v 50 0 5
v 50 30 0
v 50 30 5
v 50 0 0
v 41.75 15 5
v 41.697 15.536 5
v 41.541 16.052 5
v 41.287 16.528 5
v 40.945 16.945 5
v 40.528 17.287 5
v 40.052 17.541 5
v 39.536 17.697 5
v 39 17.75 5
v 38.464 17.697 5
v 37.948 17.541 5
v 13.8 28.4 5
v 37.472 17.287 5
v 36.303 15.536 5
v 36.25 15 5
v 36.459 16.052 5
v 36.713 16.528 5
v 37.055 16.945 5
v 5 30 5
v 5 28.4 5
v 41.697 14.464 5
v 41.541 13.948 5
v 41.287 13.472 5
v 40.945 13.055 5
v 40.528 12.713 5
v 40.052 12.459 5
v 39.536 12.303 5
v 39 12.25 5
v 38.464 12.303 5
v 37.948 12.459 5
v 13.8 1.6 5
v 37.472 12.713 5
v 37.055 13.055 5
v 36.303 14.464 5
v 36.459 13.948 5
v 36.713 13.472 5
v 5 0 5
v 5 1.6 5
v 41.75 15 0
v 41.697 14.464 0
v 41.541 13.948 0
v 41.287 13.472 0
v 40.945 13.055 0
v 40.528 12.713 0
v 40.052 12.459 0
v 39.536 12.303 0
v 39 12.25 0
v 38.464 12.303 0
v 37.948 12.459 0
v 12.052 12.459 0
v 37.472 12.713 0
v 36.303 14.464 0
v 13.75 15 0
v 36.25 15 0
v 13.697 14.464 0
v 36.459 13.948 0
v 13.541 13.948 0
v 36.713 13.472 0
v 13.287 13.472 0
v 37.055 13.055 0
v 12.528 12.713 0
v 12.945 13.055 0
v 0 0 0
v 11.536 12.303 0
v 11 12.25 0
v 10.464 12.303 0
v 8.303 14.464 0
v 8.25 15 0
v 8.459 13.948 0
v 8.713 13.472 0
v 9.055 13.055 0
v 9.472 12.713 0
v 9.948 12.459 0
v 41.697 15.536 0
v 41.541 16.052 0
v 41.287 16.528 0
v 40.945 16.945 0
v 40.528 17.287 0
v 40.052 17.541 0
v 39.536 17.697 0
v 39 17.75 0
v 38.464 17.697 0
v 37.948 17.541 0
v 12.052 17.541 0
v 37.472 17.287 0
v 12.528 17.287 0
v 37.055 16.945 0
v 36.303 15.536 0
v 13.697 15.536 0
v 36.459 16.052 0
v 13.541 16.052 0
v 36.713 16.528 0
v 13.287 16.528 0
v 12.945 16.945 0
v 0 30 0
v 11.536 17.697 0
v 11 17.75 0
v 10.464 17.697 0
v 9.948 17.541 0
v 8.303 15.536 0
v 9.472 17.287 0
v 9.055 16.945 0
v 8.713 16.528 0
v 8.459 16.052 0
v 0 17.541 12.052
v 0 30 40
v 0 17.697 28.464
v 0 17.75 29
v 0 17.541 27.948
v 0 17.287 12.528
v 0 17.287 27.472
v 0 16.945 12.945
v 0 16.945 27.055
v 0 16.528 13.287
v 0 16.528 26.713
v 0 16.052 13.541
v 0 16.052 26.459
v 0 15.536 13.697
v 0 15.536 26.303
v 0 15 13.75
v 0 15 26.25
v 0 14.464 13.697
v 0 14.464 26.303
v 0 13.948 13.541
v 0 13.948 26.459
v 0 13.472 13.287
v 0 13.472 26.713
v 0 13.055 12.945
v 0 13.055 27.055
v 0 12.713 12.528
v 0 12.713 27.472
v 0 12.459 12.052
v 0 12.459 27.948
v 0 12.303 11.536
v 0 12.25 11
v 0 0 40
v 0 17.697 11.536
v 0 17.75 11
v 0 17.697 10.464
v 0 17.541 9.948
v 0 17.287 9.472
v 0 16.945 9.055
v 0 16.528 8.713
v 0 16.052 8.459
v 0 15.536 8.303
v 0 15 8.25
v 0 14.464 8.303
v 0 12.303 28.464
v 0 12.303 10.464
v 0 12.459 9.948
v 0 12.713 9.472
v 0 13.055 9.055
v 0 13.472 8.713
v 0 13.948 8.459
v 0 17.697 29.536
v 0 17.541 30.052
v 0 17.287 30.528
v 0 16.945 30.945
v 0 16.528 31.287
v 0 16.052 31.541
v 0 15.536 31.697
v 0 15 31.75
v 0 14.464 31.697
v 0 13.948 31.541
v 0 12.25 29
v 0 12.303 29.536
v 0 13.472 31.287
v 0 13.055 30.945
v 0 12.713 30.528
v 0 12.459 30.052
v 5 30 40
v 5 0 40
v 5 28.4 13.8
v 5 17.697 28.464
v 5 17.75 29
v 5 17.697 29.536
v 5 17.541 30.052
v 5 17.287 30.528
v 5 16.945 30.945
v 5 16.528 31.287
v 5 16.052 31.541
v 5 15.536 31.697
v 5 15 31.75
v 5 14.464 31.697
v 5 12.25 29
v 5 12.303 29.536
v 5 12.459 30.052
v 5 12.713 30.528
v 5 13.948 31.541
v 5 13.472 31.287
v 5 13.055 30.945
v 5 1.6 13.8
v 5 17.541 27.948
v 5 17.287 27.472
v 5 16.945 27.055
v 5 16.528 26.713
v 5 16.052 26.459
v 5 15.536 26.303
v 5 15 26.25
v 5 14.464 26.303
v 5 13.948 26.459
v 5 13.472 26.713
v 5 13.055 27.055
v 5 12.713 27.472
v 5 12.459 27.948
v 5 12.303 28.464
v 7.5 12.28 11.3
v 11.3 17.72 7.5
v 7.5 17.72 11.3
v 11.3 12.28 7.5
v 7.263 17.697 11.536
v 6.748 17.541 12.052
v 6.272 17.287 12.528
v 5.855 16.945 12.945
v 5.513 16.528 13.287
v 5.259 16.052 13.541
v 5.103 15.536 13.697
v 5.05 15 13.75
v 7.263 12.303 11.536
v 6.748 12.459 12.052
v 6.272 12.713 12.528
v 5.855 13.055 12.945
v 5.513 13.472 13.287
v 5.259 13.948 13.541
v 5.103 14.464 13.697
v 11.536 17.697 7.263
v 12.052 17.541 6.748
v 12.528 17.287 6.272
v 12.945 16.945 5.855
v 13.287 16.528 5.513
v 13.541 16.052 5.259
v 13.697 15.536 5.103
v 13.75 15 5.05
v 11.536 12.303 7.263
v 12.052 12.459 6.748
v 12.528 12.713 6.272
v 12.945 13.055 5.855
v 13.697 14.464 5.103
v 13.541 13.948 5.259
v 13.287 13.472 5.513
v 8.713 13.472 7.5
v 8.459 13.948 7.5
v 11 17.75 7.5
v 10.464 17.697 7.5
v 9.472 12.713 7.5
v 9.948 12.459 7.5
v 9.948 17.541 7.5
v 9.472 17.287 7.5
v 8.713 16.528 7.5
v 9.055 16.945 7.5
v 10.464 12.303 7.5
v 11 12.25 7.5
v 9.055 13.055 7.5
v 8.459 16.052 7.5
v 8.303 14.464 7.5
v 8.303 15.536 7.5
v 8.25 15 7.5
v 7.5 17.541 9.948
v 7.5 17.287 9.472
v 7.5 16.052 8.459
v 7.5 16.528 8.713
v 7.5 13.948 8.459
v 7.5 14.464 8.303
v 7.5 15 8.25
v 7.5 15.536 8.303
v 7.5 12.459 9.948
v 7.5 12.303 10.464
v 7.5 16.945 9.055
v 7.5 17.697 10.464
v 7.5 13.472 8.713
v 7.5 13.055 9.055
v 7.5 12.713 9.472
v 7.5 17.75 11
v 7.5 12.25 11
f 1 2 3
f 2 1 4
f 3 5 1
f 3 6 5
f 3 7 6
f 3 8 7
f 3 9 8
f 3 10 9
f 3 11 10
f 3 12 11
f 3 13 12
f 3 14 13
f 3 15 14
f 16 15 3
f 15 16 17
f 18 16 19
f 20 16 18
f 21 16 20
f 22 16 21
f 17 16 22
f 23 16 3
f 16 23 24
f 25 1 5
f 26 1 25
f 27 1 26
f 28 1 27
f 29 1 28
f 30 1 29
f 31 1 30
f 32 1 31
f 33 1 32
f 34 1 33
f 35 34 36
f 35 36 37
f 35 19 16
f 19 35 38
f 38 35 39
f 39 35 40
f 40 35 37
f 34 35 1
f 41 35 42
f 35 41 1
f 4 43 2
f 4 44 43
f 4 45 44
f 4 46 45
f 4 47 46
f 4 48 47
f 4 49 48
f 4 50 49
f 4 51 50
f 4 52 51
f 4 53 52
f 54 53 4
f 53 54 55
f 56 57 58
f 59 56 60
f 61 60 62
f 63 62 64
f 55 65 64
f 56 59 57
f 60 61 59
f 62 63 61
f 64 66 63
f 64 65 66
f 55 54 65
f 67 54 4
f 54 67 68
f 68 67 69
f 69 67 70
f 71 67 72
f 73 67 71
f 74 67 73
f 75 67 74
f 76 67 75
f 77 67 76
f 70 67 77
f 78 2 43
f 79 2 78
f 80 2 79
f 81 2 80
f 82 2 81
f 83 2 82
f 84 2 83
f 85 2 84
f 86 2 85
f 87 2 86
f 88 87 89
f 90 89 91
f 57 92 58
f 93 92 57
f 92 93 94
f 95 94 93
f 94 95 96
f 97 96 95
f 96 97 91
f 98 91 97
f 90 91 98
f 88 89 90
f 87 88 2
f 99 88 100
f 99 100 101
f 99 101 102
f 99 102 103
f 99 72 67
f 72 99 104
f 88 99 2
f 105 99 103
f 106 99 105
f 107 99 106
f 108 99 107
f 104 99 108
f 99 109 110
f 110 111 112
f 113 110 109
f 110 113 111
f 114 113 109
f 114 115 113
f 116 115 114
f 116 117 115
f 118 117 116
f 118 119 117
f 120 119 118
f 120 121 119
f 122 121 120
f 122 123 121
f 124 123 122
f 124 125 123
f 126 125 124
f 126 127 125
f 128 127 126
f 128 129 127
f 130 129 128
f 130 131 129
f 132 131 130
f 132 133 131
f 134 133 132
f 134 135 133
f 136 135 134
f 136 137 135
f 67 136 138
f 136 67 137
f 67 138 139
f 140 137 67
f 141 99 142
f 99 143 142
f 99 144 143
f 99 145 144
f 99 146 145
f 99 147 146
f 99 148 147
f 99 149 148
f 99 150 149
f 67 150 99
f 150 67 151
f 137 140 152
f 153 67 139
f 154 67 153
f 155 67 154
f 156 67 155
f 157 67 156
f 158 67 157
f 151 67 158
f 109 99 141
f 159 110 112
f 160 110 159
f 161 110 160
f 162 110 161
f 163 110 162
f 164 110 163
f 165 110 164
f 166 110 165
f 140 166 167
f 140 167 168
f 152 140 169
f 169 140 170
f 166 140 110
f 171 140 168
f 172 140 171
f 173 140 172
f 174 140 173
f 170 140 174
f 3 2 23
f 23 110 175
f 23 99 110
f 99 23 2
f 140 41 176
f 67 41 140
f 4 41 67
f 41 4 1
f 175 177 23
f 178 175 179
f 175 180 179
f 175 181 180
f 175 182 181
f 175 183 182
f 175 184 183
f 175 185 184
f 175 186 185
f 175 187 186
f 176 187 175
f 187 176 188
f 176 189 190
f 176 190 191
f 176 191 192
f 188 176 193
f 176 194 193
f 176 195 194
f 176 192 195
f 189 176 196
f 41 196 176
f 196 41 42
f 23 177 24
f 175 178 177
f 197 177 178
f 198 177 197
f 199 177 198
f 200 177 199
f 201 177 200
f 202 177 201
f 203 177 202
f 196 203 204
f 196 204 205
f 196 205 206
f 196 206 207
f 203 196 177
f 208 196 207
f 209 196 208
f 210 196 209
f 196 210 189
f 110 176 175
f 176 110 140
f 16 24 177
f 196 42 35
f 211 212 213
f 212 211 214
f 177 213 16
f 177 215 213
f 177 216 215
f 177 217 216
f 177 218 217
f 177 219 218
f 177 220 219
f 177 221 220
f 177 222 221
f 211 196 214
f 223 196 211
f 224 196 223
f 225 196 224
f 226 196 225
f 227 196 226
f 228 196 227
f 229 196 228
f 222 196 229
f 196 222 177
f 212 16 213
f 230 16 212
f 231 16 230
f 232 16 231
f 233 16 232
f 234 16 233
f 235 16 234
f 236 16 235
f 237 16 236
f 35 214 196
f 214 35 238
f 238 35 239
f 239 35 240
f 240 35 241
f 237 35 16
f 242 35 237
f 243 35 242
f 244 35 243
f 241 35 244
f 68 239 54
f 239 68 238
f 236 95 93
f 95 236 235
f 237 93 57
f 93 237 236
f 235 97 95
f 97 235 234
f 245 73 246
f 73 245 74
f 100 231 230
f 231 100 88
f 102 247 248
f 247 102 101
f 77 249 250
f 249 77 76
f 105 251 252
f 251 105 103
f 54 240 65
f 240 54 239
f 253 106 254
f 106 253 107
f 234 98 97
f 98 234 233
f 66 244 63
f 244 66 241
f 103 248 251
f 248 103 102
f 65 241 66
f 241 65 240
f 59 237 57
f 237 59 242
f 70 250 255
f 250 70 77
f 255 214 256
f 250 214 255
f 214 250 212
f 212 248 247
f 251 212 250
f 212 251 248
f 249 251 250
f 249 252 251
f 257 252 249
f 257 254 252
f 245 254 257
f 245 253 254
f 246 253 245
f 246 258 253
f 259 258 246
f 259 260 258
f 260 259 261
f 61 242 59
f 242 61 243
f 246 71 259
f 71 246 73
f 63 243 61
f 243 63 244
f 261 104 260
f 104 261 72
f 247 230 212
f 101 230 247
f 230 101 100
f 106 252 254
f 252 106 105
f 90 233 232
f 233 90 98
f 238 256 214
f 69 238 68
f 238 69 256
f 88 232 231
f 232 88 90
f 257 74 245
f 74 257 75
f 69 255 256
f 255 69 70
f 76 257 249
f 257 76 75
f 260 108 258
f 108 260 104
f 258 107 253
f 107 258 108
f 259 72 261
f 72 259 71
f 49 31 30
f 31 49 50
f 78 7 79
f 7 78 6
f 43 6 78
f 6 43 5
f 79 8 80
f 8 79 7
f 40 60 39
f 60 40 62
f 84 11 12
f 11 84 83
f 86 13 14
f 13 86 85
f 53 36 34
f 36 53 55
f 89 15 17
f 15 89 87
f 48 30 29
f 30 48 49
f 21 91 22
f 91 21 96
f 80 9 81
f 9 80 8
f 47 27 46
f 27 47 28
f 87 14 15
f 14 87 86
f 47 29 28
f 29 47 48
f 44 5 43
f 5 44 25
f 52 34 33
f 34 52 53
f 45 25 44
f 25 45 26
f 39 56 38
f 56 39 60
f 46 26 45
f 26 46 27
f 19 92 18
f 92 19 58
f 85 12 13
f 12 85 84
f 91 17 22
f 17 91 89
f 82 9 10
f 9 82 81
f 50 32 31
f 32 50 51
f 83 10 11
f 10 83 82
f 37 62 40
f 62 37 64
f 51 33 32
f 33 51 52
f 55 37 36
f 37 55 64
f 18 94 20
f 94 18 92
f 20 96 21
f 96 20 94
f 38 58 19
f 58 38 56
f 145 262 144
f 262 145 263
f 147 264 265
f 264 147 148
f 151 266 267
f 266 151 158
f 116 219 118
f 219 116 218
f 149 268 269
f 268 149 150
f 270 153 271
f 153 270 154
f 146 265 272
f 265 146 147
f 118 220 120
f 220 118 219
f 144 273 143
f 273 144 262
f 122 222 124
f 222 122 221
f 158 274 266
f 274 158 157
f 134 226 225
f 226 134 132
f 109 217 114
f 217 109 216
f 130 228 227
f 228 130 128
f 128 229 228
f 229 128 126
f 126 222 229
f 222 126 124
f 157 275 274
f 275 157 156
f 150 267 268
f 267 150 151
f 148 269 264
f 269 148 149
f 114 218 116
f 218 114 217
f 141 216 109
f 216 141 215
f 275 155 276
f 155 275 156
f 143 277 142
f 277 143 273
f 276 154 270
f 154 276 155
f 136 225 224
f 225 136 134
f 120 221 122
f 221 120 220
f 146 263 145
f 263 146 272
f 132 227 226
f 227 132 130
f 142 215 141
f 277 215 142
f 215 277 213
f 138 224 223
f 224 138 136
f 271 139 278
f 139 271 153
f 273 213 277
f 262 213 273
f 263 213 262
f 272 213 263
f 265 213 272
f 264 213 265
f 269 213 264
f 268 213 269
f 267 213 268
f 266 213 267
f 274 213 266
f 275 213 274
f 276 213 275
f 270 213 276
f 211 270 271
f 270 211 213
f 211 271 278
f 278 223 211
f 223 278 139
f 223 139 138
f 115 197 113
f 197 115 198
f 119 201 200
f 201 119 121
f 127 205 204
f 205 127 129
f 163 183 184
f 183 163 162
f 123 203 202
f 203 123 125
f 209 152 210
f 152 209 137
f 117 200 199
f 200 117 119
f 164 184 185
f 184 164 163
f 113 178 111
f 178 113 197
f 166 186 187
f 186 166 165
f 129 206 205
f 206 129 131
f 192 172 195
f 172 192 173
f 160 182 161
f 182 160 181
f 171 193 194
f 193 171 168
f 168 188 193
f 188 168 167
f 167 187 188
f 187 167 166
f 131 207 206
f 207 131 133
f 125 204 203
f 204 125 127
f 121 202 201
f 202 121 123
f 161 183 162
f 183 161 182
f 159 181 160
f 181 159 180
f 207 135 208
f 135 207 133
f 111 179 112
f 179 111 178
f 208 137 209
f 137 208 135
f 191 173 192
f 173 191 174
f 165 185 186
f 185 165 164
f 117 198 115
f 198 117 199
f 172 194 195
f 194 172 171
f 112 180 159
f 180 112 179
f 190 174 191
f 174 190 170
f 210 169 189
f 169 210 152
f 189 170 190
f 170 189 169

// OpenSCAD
$fn = 32;

// ----------------------------------------------------------------------
// L-bracket: 50 x 30 x 40 mm
// ----------------------------------------------------------------------

// --- parameters (mm) ---
base_len = 50;            // horizontal leg, X
upright_h = 40;           // vertical leg, Z
flange_w = 30;            // bracket depth, Y
mat_t = 5;                // plate thickness
hole_d = 5.5;             // clearance for M5
rib_leg = 17.2;           // gusset leg
rib_sink = 1.6;           // gusset overlap into the plates

module hole_z(px, py) {
  translate([px, py, -2.5]) cylinder(h = mat_t + 5, d = hole_d);
}
module hole_x(pz, py) {
  translate([-2.5, py, pz]) rotate([0, 90, 0]) cylinder(h = mat_t + 5, d = hole_d);
}
module gusset() {
  translate([0, flange_w - rib_sink, 0])
    rotate([90, 0, 0])
      linear_extrude(height = flange_w - 2 * rib_sink)
        polygon(points = [[rib_sink, rib_sink], [rib_leg, rib_sink], [rib_sink, rib_leg]]);
}

difference() {
  union() {
    /* horizontal leg */
    cube([base_len, flange_w, mat_t]);
    /* vertical leg, overlapping the corner block */
    cube([mat_t, flange_w, upright_h]);
    gusset();
  }
  hole_z(11, 15);
  hole_z(39, 15);
  hole_x(11, 15);
  hole_x(29, 15);
}
